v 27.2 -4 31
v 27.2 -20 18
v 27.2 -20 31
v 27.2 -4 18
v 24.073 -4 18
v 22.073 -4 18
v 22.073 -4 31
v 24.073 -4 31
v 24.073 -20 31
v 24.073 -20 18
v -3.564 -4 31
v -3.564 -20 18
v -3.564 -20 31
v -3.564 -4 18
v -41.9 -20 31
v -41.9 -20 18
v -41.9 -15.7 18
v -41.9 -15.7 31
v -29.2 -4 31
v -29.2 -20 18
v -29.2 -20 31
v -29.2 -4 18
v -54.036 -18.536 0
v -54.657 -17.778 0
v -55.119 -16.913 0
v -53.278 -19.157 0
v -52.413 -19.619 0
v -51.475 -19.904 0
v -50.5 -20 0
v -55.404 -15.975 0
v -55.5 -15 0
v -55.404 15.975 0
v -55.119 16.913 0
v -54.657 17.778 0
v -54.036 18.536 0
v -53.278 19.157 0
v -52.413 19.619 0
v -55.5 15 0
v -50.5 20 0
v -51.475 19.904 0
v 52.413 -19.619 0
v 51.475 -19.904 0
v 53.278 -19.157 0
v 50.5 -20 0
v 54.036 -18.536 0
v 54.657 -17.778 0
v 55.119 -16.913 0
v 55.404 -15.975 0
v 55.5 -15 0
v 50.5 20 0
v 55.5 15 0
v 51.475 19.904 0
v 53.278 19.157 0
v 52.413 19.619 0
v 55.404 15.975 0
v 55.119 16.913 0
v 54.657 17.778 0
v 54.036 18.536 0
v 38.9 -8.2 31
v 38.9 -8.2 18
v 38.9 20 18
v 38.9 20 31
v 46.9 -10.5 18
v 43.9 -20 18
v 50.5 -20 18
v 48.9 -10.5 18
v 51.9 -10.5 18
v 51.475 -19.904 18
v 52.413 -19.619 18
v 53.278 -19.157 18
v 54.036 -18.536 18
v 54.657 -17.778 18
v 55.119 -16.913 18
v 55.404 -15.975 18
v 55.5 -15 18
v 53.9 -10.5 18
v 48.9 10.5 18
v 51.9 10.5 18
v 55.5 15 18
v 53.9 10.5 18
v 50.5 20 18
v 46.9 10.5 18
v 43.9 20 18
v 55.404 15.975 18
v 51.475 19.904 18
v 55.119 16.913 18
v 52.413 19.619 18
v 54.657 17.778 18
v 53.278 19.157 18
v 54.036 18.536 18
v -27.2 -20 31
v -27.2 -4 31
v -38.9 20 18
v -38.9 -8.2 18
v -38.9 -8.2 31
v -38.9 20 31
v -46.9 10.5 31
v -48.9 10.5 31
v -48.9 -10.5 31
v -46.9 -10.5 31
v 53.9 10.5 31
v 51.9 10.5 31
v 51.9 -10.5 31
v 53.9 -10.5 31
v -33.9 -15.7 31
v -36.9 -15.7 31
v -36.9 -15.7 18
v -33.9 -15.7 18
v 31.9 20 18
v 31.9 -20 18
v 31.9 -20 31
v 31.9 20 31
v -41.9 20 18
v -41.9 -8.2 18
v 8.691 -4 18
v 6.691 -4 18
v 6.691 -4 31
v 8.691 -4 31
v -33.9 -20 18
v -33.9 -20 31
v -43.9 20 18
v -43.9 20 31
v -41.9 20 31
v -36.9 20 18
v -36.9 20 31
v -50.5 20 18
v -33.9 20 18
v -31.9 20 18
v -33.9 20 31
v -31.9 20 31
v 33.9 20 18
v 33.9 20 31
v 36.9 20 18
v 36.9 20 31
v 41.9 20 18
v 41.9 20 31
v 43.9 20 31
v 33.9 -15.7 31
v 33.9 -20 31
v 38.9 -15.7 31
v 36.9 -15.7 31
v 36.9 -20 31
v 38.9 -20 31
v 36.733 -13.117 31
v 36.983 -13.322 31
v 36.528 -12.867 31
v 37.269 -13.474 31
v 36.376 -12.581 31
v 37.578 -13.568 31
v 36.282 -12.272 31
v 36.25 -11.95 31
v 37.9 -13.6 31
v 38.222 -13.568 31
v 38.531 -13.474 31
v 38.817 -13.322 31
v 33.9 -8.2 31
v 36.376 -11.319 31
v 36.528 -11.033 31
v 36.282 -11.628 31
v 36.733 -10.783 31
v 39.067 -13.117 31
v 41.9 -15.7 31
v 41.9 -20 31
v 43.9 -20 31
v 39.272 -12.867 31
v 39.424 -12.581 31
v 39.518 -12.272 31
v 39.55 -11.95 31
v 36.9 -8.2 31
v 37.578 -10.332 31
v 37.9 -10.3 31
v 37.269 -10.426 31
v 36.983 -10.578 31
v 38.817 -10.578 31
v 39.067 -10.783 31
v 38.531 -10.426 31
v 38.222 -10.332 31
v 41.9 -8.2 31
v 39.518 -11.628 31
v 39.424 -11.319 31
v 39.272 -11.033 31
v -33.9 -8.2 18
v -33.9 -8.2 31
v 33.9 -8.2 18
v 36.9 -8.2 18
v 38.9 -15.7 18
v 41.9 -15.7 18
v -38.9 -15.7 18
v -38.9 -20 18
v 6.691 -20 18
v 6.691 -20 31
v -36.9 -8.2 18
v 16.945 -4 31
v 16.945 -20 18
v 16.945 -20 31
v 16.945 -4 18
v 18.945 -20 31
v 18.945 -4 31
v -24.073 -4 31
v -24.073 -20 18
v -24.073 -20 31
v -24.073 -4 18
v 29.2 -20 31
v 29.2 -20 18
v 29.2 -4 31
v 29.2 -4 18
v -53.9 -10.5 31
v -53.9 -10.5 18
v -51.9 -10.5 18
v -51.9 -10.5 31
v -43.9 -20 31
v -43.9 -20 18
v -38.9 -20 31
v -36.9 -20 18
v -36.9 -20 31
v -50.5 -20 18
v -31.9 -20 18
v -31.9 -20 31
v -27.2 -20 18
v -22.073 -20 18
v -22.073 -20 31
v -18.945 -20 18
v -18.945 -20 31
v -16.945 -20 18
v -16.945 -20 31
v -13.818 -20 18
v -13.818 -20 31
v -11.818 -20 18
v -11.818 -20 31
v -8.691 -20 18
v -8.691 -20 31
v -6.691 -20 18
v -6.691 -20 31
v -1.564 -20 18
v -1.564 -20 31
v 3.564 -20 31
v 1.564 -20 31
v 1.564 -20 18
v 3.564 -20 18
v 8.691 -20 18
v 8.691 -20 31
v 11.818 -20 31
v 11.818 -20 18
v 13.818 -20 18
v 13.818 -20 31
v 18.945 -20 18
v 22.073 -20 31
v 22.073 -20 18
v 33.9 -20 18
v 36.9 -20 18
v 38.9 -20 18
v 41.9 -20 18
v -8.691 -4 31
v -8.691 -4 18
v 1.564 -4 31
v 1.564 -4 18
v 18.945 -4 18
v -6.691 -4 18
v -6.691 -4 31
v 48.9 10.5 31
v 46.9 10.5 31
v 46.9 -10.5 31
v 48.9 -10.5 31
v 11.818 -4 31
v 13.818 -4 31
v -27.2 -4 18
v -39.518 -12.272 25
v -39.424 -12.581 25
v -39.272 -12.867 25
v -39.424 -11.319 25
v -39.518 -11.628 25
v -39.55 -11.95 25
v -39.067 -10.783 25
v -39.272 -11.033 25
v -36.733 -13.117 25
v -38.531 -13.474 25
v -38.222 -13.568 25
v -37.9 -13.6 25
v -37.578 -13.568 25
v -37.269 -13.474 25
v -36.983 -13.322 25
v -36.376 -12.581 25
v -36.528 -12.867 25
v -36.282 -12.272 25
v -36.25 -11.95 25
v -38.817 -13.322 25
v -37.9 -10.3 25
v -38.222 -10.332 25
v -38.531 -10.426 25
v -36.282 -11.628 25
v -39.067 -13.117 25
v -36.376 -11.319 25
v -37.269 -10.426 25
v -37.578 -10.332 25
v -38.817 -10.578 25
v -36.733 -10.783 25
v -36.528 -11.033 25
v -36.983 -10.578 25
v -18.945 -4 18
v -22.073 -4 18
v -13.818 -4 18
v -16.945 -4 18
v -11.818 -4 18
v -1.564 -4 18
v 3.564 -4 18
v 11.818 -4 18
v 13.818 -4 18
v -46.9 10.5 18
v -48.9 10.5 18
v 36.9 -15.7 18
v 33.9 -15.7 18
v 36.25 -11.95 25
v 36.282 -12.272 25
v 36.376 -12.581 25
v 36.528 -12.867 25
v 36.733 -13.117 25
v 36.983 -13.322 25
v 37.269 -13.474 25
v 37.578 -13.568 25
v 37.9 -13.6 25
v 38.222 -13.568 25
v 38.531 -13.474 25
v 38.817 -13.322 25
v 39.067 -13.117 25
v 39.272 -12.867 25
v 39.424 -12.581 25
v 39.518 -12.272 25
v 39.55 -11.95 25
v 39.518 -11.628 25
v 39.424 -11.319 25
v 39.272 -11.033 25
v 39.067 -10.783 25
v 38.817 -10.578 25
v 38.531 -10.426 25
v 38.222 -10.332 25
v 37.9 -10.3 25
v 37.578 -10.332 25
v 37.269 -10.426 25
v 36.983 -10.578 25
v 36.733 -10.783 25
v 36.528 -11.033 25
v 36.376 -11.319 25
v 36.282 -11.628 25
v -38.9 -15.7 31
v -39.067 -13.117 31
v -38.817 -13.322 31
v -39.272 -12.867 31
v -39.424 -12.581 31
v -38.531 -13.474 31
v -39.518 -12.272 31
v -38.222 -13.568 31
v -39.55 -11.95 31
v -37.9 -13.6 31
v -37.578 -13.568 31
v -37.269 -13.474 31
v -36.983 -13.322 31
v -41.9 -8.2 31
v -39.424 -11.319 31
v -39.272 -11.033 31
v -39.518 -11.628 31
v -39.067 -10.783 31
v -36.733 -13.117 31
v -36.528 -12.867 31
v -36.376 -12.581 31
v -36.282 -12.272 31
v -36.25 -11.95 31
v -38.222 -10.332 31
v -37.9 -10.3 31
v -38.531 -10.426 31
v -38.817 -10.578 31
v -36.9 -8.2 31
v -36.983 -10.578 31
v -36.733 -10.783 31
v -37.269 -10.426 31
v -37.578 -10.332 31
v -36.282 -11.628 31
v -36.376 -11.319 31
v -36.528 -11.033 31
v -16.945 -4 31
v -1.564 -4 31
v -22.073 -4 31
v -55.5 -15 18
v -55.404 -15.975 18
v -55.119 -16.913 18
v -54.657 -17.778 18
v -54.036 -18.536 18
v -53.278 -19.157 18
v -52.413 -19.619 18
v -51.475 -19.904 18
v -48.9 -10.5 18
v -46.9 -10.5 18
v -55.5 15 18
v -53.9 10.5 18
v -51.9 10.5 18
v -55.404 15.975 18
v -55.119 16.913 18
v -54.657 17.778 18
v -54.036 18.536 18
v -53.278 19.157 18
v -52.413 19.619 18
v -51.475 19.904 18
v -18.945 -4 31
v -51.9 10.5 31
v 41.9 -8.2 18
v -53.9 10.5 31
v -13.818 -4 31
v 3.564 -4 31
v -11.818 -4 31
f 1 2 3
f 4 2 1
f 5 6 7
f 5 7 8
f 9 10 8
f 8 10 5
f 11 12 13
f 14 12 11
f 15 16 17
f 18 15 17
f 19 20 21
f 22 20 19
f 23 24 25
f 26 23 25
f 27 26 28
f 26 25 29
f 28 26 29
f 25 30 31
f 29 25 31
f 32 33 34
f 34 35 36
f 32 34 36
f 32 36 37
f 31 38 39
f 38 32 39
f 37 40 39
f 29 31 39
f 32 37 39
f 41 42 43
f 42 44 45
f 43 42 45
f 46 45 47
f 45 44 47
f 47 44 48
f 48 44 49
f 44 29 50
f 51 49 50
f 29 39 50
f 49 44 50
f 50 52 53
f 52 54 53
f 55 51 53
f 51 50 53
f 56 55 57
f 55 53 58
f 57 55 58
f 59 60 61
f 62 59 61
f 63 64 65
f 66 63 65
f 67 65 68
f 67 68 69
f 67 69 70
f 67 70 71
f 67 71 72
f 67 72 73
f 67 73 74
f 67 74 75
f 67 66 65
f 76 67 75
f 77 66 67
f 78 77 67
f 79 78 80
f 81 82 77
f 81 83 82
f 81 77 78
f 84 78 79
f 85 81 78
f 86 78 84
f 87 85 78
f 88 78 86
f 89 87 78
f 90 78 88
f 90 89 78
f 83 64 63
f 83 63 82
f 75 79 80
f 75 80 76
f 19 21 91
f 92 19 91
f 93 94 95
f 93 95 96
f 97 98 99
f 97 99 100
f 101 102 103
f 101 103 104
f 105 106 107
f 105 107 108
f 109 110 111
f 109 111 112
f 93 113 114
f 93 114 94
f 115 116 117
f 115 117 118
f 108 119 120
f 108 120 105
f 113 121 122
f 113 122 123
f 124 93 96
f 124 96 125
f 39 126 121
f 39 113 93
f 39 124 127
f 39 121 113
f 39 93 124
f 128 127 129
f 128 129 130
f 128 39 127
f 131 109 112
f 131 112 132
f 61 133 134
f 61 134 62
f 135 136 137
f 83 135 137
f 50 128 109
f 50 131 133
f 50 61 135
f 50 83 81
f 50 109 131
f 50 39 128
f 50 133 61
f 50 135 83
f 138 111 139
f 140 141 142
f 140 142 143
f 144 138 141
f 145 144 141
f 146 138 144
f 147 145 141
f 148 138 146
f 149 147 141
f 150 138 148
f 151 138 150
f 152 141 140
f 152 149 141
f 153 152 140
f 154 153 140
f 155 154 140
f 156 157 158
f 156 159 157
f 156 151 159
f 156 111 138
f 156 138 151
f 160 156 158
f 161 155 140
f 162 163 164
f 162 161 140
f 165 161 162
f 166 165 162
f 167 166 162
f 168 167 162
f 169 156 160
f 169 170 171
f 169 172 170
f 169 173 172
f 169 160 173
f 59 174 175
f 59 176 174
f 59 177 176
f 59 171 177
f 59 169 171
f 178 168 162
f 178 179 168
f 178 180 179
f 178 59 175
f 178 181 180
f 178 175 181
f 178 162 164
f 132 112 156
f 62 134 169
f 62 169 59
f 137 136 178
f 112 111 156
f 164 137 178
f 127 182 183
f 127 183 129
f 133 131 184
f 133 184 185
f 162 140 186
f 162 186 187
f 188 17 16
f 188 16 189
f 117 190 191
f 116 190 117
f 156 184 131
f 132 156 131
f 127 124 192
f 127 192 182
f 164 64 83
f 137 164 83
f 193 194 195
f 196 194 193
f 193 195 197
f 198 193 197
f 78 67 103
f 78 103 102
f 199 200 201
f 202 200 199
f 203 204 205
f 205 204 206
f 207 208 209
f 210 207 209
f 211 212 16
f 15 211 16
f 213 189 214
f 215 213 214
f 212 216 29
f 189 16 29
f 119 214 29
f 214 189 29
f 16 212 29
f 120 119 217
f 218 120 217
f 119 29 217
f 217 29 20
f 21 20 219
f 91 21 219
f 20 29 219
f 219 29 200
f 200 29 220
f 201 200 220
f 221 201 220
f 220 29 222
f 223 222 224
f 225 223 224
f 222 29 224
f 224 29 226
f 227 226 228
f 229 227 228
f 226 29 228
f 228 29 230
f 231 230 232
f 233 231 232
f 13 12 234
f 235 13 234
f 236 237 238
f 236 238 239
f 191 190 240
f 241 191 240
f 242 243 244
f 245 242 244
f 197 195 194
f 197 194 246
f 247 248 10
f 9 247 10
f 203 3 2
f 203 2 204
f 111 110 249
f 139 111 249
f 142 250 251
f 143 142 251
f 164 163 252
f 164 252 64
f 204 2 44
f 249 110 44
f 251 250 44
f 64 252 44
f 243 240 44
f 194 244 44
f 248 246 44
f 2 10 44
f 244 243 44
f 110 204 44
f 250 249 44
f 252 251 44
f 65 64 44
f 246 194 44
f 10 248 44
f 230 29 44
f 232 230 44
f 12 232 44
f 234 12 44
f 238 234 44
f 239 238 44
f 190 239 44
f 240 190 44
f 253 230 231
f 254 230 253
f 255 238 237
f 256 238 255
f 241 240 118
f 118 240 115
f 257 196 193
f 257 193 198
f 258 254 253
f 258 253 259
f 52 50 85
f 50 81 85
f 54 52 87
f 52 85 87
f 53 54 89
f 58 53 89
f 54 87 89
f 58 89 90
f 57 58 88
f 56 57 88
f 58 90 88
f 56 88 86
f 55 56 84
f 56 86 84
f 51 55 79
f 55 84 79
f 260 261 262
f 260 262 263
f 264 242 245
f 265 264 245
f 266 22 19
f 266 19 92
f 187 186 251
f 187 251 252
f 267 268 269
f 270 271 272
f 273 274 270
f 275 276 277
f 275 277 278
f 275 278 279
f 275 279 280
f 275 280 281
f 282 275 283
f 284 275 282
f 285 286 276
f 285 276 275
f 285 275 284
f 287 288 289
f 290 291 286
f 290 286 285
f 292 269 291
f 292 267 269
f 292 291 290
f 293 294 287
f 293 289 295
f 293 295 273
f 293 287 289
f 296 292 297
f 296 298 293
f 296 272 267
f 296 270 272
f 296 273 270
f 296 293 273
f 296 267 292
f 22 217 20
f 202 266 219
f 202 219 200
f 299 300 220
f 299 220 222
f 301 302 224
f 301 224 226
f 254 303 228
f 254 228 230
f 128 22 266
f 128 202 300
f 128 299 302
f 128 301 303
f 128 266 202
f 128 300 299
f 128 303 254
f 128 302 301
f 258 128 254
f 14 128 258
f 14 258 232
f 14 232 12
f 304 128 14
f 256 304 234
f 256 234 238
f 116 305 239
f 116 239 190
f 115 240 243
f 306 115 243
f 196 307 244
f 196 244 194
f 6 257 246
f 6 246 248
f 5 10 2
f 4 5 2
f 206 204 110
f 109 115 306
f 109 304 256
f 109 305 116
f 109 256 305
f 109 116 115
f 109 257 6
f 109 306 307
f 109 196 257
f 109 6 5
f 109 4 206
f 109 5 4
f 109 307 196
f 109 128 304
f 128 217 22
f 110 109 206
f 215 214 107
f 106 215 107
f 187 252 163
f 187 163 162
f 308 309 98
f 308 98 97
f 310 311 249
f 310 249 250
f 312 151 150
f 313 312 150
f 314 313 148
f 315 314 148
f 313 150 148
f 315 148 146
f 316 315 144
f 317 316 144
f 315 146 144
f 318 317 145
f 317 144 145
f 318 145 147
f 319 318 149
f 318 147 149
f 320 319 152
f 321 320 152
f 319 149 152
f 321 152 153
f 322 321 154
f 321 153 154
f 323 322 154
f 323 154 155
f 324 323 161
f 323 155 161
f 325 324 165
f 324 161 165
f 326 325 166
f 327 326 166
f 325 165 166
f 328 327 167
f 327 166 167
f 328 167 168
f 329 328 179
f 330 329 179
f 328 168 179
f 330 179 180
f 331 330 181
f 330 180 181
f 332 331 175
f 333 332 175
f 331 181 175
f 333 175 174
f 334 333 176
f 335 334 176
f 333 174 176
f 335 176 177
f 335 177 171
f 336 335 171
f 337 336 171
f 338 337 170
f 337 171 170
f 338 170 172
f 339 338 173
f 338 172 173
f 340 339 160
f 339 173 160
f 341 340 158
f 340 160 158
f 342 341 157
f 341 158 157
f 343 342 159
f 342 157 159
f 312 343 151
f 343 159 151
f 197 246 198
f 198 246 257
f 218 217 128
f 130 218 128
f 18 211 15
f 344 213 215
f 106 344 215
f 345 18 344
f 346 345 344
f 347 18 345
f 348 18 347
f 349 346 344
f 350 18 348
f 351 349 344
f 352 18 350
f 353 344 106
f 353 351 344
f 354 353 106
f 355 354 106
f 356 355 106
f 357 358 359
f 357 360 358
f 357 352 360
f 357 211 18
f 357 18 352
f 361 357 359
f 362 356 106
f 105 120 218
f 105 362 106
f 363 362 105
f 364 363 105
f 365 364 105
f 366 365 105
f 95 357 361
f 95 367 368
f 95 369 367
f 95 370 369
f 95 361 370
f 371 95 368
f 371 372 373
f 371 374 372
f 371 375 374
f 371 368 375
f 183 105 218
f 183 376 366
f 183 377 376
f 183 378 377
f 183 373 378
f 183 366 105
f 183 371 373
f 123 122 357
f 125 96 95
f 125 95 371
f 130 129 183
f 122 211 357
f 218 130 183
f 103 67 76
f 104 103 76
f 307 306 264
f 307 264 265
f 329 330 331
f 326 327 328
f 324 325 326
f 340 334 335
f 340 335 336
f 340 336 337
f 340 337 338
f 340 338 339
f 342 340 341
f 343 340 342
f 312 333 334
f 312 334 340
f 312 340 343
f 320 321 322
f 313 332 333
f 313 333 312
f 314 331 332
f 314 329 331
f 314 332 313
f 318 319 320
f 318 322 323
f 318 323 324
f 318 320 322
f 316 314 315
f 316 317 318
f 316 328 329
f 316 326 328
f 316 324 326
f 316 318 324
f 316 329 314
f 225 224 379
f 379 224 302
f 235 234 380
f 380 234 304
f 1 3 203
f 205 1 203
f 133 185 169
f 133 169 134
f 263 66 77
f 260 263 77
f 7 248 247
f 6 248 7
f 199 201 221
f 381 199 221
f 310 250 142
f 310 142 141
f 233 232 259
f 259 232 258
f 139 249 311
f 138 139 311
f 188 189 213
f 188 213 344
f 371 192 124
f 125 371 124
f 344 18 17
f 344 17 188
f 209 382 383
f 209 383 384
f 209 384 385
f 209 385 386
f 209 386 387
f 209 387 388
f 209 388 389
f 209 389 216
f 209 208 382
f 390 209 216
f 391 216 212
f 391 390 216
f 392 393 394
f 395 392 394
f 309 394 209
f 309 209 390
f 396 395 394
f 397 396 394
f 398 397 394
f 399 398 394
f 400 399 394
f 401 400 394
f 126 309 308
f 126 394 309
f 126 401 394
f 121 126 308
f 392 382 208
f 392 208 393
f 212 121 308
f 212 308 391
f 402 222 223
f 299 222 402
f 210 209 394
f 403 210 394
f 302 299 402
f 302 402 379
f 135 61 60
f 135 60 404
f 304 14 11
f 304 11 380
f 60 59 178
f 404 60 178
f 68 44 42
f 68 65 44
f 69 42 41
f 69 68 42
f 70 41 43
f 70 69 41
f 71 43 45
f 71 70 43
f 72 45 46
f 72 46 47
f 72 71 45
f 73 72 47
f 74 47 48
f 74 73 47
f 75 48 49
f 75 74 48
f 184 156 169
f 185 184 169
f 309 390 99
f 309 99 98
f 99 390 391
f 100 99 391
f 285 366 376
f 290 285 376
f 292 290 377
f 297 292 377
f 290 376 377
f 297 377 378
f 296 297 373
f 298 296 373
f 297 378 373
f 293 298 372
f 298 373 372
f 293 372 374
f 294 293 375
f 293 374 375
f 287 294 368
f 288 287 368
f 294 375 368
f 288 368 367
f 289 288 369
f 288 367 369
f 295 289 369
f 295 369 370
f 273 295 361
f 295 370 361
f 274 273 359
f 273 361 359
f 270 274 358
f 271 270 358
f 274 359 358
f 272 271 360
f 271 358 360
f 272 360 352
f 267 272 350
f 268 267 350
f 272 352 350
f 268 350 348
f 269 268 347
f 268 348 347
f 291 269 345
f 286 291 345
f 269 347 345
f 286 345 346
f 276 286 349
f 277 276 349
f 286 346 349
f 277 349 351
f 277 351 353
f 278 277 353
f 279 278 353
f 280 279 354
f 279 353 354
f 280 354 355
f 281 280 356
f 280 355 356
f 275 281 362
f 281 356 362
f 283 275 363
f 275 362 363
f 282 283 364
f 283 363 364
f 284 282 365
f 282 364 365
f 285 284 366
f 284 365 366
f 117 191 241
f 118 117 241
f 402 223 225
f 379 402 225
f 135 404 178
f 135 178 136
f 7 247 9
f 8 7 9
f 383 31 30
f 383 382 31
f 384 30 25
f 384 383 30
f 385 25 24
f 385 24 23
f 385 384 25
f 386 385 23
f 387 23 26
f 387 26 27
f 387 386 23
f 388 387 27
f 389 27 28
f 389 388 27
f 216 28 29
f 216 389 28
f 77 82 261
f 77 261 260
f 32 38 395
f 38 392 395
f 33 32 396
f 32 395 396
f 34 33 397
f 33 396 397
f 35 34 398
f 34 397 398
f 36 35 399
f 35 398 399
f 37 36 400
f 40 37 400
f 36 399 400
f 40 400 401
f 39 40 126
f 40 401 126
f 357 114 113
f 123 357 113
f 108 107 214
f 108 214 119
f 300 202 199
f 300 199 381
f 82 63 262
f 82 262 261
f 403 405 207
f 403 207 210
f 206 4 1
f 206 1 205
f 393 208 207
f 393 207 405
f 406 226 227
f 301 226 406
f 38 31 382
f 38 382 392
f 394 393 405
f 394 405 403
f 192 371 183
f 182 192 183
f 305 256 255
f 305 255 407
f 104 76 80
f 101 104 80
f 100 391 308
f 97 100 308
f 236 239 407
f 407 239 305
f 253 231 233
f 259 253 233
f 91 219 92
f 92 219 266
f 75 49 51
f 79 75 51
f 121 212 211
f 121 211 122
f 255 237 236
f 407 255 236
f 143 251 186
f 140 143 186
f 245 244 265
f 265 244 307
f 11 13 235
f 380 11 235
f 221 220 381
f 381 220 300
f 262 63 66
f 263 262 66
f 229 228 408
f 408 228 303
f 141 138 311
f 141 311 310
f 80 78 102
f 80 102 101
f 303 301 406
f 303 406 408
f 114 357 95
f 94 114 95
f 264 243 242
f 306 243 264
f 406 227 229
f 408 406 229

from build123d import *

# Parameters (mm, degrees)
ESBO_O1_W                = 111
ESBO_O1_H                = 40
RESSALTO_EXTRUS_O1_DEPTH = 18
ESBO_O2_W                = 2
ESBO_O2_H                = 16
ESBO_O2_H_2              = 21
ESBO_O2_H_3              = 40
RESSALTO_EXTRUS_O2_DEPTH = 13
RESSALTO_EXTRUS_O3_REACH = 68.643
ESBO_O3_W                = 3
ESBO_O3_H                = 7.5
ESBO_O4_R                = 1.65
CORTE_EXTRUS_O1_DEPTH    = 6
FILETE1_R                = 5


with BuildPart() as part:
    # Esboço1 → Ressalto-extrusão1 (new body)
    with BuildSketch(Plane.XY):
        Rectangle(ESBO_O1_W, ESBO_O1_H)
    extrude(amount=RESSALTO_EXTRUS_O1_DEPTH)

    # Esboço2 → Ressalto-extrusão2 (add)
    with BuildSketch(Plane.XY.offset(18)):
        with Locations((-28.2, -12)):
            Rectangle(ESBO_O2_W, ESBO_O2_H)
        with Locations((-23.072727273, -12)):
            Rectangle(ESBO_O2_W, ESBO_O2_H)
        with Locations((-17.945454545, -12)):
            Rectangle(ESBO_O2_W, ESBO_O2_H)
        with Locations((-12.818181818, -12)):
            Rectangle(ESBO_O2_W, ESBO_O2_H)
        with Locations((-7.690909091, -12)):
            Rectangle(ESBO_O2_W, ESBO_O2_H)
        with Locations((-2.563636364, -12)):
            Rectangle(ESBO_O2_W, ESBO_O2_H)
        with Locations((2.563636364, -12)):
            Rectangle(ESBO_O2_W, ESBO_O2_H)
        with Locations((7.690909091, -12)):
            Rectangle(ESBO_O2_W, ESBO_O2_H)
        with Locations((12.818181818, -12)):
            Rectangle(ESBO_O2_W, ESBO_O2_H)
        with Locations((17.945454545, -12)):
            Rectangle(ESBO_O2_W, ESBO_O2_H)
        with Locations((23.072727273, -12)):
            Rectangle(ESBO_O2_W, ESBO_O2_H)
        with Locations((28.2, -12)):
            Rectangle(ESBO_O2_W, ESBO_O2_H)
        with Locations((-47.9, 0)):
            Rectangle(ESBO_O2_W, ESBO_O2_H_2)
        with Locations((-52.9, 0)):
            Rectangle(ESBO_O2_W, ESBO_O2_H_2)
        with Locations((-42.9, 0)):
            Rectangle(ESBO_O2_W, ESBO_O2_H_3)
        with Locations((-37.9, 0)):
            Rectangle(ESBO_O2_W, ESBO_O2_H_3)
        with Locations((-32.9, 0)):
            Rectangle(ESBO_O2_W, ESBO_O2_H_3)
        with Locations((32.9, 0)):
            Rectangle(ESBO_O2_W, ESBO_O2_H_3)
        with Locations((37.9, 0)):
            Rectangle(ESBO_O2_W, ESBO_O2_H_3)
        with Locations((42.9, 0)):
            Rectangle(ESBO_O2_W, ESBO_O2_H_3)
        with Locations((47.9, 0)):
            Rectangle(ESBO_O2_W, ESBO_O2_H_2)
        with Locations((52.9, 0)):
            Rectangle(ESBO_O2_W, ESBO_O2_H_2)
    extrude(amount=RESSALTO_EXTRUS_O2_DEPTH)

    # Esboço3 → Ressalto-extrusão3 (add, up to next)
    with BuildSketch(Plane.XY.offset(31), mode=Mode.PRIVATE) as ressalto_extrus_o3_sk1:
        with Locations((-40.4, -11.95)):
            Rectangle(ESBO_O3_W, ESBO_O3_H)
    ressalto_extrus_o3_tool1 = extrude(ressalto_extrus_o3_sk1.sketch, amount=-RESSALTO_EXTRUS_O3_REACH, mode=Mode.PRIVATE) - part.part
    # Esboço3 → Ressalto-extrusão3 (add, up to next)
    with BuildSketch(Plane.XY.offset(31), mode=Mode.PRIVATE) as ressalto_extrus_o3_sk2:
        with Locations((-35.4, -11.95)):
            Rectangle(ESBO_O3_W, ESBO_O3_H)
    ressalto_extrus_o3_tool2 = extrude(ressalto_extrus_o3_sk2.sketch, amount=-RESSALTO_EXTRUS_O3_REACH, mode=Mode.PRIVATE) - part.part
    # Esboço3 → Ressalto-extrusão3 (add, up to next)
    with BuildSketch(Plane.XY.offset(31), mode=Mode.PRIVATE) as ressalto_extrus_o3_sk3:
        with Locations((35.4, -11.95)):
            Rectangle(ESBO_O3_W, ESBO_O3_H)
    ressalto_extrus_o3_tool3 = extrude(ressalto_extrus_o3_sk3.sketch, amount=-RESSALTO_EXTRUS_O3_REACH, mode=Mode.PRIVATE) - part.part
    # Esboço3 → Ressalto-extrusão3 (add, up to next)
    with BuildSketch(Plane.XY.offset(31), mode=Mode.PRIVATE) as ressalto_extrus_o3_sk4:
        with Locations((40.4, -11.95)):
            Rectangle(ESBO_O3_W, ESBO_O3_H)
    ressalto_extrus_o3_tool4 = extrude(ressalto_extrus_o3_sk4.sketch, amount=-RESSALTO_EXTRUS_O3_REACH, mode=Mode.PRIVATE) - part.part
    add(ressalto_extrus_o3_tool1.solids().sort_by_distance((-40.4, -11.95, 31))[0])
    add(ressalto_extrus_o3_tool2.solids().sort_by_distance((-35.4, -11.95, 31))[0])
    add(ressalto_extrus_o3_tool3.solids().sort_by_distance((35.4, -11.95, 31))[0])
    add(ressalto_extrus_o3_tool4.solids().sort_by_distance((40.4, -11.95, 31))[0])

    # Esboço4 → Corte-extrusão1 (cut)
    with BuildSketch(Plane.XY.offset(31)):
        with Locations((-37.9, -11.95)):
            Circle(ESBO_O4_R)
        with Locations(Location((37.9, -11.95, 0), (0, 0, 180))):
            Circle(ESBO_O4_R)
    extrude(amount=-CORTE_EXTRUS_O1_DEPTH, mode=Mode.SUBTRACT)

    # Filete1
    filete1_edges = [part.edges().sort_by_distance(p)[0] for p in [
        (-55.5, 20, 9),
        (55.5, 20, 9),
        (55.5, -20, 9),
        (-55.5, -20, 9),
    ]]
    fillet(filete1_edges, radius=FILETE1_R)


solid = part.part
